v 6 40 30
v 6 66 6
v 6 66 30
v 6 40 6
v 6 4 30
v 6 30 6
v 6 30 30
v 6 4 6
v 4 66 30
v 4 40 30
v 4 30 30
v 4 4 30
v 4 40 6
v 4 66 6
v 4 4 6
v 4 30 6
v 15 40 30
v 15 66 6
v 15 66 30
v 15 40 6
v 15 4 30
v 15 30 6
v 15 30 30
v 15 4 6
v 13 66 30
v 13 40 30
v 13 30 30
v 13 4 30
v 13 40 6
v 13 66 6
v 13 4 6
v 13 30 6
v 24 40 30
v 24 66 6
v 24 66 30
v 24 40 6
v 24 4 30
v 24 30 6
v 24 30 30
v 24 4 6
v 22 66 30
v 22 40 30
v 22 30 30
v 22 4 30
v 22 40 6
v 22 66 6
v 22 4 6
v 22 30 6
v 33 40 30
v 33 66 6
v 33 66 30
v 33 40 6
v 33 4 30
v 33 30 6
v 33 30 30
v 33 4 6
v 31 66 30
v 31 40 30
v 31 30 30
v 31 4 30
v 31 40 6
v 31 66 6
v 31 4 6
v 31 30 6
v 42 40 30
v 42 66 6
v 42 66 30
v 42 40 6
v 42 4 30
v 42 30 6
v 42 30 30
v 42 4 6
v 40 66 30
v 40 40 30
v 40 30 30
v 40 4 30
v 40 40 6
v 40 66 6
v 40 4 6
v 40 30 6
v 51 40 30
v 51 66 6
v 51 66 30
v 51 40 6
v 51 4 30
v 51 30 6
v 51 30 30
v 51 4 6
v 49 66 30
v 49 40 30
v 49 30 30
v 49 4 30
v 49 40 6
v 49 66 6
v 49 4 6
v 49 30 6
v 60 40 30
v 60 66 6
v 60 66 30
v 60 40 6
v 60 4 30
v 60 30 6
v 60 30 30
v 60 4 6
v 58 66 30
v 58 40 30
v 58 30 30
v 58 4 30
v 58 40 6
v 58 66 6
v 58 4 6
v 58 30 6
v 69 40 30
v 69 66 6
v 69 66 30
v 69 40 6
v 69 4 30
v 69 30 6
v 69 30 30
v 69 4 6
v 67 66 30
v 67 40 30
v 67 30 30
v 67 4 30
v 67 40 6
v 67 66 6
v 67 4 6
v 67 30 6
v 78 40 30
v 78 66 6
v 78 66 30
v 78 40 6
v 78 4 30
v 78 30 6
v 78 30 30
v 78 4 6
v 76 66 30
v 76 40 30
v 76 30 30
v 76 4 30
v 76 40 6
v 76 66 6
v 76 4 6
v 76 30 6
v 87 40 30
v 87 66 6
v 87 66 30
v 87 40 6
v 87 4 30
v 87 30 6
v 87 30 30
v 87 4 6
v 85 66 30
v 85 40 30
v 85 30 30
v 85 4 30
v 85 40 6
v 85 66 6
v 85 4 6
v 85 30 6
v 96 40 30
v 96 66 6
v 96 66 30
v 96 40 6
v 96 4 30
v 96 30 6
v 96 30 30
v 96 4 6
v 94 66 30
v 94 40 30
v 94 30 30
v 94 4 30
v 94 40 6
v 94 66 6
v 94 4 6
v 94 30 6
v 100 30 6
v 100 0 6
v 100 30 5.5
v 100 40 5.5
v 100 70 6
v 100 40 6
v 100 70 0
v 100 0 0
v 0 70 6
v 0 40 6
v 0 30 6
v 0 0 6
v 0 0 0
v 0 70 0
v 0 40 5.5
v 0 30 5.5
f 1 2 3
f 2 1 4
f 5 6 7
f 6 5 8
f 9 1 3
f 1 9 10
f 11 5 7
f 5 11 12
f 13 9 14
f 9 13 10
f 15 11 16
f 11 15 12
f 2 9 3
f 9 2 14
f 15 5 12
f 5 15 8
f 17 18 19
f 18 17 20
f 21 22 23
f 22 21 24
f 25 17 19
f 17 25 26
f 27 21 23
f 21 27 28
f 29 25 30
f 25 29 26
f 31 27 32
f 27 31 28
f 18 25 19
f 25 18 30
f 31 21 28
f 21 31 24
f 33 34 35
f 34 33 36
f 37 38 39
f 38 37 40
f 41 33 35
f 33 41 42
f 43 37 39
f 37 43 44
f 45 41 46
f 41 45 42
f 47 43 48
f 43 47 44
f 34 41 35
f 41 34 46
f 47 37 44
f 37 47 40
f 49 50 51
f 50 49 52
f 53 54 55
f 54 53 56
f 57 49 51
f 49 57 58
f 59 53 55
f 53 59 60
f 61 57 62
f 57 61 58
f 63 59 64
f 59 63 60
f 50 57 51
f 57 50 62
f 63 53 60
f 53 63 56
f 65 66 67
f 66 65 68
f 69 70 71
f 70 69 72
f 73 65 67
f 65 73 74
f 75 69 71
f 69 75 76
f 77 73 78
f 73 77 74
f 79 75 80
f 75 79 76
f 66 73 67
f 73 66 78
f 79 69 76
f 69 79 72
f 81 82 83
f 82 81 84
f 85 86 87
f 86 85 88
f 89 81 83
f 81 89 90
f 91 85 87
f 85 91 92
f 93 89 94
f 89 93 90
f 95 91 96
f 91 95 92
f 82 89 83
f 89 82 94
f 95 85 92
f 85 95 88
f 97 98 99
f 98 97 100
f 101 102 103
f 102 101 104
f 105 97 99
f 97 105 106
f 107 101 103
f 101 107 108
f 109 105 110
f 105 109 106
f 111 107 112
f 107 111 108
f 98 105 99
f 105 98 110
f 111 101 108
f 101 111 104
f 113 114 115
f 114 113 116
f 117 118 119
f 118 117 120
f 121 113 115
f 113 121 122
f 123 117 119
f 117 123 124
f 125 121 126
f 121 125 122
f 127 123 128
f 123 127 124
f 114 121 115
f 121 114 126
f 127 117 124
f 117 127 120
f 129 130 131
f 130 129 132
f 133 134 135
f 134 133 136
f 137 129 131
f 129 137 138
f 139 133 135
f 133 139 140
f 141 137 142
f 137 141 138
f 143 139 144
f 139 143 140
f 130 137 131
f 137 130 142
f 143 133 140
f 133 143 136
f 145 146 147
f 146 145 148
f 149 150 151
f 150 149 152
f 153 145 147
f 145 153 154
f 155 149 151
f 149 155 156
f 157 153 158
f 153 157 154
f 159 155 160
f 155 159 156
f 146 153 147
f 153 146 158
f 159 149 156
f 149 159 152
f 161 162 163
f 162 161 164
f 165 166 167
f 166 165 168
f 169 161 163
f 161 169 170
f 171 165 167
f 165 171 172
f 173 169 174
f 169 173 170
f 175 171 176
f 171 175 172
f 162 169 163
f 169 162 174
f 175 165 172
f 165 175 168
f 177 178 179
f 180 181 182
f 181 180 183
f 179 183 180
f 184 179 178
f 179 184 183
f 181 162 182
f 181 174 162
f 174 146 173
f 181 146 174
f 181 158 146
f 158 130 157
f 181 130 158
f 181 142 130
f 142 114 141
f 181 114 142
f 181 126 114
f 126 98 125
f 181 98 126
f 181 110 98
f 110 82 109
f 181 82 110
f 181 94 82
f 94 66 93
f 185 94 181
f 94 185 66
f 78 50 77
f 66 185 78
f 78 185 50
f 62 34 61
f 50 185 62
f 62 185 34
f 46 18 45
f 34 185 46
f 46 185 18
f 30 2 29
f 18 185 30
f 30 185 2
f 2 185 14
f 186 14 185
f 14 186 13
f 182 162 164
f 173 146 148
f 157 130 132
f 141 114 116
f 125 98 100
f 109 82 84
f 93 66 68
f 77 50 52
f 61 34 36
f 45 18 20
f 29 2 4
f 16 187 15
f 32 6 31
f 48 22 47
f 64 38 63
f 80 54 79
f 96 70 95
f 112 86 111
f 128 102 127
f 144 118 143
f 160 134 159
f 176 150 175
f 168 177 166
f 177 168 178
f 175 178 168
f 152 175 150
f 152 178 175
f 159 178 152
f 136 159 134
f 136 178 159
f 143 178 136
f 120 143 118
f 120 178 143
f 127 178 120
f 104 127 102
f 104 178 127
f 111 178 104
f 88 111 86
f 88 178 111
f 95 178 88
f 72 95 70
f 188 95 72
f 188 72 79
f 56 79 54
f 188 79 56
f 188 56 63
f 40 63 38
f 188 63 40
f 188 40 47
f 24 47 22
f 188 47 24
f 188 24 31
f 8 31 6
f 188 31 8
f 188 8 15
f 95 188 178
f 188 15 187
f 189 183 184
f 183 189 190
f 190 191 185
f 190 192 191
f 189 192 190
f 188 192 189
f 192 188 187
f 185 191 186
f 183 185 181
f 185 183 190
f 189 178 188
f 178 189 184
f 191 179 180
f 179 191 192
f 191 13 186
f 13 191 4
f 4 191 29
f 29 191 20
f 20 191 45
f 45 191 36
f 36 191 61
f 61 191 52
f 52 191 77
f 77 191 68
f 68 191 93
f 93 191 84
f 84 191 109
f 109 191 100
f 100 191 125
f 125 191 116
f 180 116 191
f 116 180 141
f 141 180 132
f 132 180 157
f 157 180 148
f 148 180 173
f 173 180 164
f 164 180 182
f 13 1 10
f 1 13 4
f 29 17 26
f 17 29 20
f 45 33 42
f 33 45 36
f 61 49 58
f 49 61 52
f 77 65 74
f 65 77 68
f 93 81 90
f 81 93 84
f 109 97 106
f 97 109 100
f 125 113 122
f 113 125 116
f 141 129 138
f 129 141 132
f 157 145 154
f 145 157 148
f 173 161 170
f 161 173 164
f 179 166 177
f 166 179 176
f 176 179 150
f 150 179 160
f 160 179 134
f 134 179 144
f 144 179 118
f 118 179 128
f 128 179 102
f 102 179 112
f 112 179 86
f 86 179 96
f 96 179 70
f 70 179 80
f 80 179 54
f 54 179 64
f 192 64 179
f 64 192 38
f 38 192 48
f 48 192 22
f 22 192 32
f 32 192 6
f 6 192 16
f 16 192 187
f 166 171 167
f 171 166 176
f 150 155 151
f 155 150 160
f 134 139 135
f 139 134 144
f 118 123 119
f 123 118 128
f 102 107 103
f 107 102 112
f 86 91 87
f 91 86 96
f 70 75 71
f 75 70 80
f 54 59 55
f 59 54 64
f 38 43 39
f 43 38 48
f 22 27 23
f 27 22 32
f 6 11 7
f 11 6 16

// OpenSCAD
$fn = 32;

// ----------------------------------------------------------------------
// Heatsink: slotted fin block
// ----------------------------------------------------------------------

// --- parameters (mm) ---
base_l = 100;             // base length, X
base_w = 70;              // base width, Y
base_t = 6;               // base plate thickness
fin_h = 25;               // fin height above the base
fin_t = 2;                // fin thickness
edge = 4;                 // margin from the base ends
pitch = 9;                // fin pitch
slot_w = 10;              // central slot width, Y

n_fins = floor((base_l - 2 * edge - fin_t) / pitch) + 1;  // fin count
total_h = base_t + fin_h - 1;  // overall height

difference() {
union() {
  cube([base_l, base_w, base_t]);
  for (i = [0 : n_fins - 1])
    translate([edge + i * pitch, edge, base_t - 1])
      cube([fin_t, base_w - 2 * edge, fin_h]);
}
  translate([-1, base_w / 2 - slot_w / 2, base_t - 0.5])
    cube([base_l + 2, slot_w, fin_h + 2]);
}
